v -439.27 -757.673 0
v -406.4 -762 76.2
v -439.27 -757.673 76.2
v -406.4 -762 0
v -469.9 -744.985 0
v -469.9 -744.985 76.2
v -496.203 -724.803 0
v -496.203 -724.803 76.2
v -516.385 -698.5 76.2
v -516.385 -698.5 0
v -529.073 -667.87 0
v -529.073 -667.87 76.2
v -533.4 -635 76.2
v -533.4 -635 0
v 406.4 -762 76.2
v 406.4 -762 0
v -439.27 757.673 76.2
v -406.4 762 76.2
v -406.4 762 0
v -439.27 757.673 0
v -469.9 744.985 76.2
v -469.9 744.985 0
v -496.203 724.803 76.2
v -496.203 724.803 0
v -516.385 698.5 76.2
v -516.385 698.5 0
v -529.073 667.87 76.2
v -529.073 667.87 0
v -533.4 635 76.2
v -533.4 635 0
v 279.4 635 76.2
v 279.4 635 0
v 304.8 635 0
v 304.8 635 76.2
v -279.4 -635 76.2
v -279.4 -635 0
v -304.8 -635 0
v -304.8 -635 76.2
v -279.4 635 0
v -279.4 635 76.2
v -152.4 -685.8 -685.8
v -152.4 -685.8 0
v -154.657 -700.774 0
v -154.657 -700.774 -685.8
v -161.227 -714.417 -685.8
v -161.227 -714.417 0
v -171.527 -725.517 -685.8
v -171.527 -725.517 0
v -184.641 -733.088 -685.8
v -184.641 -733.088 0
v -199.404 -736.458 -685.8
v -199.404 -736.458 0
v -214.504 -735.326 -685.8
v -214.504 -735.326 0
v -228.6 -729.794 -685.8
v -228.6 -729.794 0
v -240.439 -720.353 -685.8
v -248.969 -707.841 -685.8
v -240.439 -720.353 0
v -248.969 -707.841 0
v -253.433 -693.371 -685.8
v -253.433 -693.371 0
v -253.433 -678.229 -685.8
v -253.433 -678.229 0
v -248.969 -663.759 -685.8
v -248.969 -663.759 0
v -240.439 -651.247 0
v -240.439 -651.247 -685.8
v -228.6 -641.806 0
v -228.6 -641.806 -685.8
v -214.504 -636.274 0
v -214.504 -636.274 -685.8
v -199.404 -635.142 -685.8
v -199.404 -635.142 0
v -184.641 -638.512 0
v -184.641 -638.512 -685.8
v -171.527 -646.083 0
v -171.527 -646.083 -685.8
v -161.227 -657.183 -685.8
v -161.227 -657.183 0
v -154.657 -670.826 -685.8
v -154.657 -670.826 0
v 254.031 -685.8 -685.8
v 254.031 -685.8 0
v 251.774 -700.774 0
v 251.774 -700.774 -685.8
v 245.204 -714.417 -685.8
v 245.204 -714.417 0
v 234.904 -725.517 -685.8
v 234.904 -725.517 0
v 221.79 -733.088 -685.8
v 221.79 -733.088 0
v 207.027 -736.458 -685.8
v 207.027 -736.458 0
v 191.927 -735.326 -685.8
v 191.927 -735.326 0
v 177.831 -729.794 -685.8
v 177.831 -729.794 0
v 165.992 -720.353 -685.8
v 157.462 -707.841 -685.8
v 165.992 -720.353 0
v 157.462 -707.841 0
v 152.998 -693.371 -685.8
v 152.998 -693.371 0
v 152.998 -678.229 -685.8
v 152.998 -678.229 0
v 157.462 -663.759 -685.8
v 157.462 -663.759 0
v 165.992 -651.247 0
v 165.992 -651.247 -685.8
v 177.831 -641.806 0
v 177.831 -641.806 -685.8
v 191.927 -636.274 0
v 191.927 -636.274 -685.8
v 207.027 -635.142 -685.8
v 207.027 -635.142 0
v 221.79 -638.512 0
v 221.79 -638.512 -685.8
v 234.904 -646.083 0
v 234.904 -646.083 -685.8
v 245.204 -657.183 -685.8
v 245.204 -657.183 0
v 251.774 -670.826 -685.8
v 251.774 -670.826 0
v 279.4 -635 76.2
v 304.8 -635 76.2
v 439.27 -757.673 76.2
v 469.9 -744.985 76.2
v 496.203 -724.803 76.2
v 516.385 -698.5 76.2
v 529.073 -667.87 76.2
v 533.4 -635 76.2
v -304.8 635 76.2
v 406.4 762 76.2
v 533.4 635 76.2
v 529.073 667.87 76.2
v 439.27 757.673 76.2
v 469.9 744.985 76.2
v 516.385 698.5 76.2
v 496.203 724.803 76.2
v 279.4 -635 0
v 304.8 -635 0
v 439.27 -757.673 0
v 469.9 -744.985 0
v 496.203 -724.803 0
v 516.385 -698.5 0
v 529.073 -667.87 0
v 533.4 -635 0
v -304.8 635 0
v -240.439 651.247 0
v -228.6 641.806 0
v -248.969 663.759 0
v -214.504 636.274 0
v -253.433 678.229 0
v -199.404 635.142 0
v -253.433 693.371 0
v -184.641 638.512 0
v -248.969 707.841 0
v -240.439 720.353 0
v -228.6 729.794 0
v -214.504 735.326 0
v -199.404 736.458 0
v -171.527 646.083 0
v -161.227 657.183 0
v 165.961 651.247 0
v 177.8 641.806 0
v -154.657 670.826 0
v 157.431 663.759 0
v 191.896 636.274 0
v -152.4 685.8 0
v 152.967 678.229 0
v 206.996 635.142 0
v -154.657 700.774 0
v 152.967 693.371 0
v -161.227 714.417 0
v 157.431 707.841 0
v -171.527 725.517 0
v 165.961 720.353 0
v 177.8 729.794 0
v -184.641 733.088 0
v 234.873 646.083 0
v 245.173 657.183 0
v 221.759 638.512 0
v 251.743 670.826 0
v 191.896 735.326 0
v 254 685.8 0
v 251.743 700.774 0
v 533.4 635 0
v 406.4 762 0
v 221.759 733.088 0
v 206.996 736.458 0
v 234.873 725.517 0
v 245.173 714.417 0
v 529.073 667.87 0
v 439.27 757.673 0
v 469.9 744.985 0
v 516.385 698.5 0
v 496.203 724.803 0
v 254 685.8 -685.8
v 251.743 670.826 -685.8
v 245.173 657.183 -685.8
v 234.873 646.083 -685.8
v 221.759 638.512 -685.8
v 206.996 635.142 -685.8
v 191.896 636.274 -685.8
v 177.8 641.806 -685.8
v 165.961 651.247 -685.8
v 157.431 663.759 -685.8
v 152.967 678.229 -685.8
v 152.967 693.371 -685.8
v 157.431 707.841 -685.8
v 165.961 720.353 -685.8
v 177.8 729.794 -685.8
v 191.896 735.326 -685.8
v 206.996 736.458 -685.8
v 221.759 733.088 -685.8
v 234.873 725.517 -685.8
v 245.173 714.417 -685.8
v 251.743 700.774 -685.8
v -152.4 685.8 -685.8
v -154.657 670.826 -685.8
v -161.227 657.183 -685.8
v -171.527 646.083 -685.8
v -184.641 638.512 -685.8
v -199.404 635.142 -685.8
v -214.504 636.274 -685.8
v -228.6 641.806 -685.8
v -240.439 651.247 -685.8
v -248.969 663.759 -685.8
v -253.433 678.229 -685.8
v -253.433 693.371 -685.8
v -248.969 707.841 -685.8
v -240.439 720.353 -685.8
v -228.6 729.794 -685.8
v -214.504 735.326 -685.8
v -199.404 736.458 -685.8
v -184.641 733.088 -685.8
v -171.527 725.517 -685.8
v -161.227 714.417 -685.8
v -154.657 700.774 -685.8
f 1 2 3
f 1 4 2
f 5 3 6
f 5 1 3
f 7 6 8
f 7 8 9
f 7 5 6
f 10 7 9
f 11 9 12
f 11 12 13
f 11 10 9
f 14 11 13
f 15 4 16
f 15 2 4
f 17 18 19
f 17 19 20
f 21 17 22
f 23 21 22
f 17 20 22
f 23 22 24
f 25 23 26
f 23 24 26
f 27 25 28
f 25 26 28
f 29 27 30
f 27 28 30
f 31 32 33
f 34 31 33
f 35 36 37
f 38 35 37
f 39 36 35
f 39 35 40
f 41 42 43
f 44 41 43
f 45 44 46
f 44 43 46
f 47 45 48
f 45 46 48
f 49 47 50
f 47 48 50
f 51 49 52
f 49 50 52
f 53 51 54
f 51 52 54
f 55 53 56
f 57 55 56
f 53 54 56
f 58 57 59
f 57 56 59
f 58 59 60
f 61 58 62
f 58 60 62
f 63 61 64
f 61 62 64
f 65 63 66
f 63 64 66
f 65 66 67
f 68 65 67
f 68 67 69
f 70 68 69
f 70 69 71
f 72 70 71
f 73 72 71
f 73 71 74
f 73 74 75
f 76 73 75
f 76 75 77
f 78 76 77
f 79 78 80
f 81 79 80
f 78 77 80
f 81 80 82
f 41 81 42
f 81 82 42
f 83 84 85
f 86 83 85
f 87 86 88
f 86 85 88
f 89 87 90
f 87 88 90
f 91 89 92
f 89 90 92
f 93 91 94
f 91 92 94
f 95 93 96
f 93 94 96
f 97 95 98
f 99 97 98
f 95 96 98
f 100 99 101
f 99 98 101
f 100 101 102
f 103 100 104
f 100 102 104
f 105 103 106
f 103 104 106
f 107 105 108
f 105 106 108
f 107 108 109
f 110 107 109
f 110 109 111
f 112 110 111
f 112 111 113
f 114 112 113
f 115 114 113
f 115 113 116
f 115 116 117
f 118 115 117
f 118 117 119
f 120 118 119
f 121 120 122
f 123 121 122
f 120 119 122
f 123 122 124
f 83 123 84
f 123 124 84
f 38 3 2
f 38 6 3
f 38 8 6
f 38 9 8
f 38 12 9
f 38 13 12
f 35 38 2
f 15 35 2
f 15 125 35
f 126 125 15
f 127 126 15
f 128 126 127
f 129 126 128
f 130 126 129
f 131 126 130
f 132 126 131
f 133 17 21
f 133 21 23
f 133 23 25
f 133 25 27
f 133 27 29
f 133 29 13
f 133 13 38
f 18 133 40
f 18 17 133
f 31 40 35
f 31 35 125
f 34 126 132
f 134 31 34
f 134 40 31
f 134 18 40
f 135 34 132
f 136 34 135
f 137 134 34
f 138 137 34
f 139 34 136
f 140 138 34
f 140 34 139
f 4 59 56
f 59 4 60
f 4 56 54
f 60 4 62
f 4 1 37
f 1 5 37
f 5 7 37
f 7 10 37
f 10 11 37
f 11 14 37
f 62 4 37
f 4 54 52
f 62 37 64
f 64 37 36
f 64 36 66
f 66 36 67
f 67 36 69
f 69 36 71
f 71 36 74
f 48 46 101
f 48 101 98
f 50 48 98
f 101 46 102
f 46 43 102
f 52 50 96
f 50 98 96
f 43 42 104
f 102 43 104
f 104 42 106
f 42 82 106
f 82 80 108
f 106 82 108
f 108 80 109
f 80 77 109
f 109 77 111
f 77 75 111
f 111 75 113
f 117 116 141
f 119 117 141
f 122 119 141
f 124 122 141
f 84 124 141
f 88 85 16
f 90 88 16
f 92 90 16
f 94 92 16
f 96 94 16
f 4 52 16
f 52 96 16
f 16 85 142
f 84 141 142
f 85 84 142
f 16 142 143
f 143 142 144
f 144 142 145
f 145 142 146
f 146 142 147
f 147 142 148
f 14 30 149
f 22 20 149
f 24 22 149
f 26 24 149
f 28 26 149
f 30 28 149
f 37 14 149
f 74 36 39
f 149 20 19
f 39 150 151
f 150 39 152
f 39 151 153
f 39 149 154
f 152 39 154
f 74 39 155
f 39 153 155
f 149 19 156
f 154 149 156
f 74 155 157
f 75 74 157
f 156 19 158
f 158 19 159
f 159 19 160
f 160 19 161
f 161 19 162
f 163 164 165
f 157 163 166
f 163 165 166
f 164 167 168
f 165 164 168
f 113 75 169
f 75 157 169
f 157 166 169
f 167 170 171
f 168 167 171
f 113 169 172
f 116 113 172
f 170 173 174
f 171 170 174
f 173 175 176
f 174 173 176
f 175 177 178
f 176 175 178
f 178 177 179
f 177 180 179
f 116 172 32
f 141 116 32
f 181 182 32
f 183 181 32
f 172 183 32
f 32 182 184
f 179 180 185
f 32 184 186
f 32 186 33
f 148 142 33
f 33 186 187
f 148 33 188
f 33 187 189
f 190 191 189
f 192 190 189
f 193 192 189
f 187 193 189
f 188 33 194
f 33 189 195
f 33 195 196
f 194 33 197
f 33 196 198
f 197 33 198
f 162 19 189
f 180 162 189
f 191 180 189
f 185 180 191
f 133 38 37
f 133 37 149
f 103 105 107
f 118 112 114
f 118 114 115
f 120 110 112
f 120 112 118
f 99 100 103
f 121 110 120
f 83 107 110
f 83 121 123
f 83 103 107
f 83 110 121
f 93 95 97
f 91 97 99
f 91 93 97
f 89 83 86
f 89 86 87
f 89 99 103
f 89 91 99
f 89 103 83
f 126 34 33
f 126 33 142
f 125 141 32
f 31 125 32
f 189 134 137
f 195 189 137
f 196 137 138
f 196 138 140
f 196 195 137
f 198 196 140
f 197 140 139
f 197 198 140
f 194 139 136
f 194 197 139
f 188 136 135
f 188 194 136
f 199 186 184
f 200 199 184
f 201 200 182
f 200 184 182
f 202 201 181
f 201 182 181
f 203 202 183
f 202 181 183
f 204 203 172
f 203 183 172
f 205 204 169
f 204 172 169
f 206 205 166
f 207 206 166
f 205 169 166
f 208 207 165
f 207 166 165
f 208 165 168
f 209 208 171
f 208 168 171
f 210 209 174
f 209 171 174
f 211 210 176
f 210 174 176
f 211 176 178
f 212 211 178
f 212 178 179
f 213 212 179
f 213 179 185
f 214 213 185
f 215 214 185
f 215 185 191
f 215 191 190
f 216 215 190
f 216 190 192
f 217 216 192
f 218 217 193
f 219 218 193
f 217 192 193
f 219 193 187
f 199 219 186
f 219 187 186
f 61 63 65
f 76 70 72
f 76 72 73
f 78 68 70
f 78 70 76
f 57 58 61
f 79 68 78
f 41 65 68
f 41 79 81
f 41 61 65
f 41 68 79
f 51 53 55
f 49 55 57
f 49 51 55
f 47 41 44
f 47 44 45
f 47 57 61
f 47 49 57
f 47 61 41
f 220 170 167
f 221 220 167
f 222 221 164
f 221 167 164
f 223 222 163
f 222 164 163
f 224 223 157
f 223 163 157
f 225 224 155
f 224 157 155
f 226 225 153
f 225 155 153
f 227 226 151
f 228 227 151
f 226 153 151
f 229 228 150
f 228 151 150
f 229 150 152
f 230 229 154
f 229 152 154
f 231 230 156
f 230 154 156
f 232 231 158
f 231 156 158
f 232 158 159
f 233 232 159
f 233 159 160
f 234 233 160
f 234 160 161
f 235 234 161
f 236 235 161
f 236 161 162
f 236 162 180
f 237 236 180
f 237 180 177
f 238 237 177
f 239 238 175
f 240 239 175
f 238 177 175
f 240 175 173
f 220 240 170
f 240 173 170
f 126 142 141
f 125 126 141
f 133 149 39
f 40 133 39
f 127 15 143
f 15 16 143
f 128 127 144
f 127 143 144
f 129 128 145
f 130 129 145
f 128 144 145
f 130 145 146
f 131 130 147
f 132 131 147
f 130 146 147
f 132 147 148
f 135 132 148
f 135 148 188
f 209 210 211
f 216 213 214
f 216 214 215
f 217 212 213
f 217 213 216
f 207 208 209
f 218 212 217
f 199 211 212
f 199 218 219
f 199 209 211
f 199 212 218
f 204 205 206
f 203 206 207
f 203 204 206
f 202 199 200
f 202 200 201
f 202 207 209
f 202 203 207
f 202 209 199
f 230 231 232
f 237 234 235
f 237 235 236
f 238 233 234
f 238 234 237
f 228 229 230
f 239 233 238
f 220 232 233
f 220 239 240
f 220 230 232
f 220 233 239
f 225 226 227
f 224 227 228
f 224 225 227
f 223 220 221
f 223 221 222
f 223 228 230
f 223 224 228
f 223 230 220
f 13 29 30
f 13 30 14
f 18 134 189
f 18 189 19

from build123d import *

# Parameters (mm, degrees)
F0_W     = 558.8
F0_H     = 1524
F1_DEPTH = 76.2
F2_R     = 50.8
F3_DEPTH = 685.8
F5_DEPTH = 76.2
F6_R     = 127


with BuildPart() as f1:
    # F0 (on Top) → F1 (new body)
    with BuildSketch(Plane.XY):
        Rectangle(F0_W, F0_H)
    extrude(amount=F1_DEPTH)

    # F2 (on face) → F3 (join)
    with BuildSketch(Plane(origin=(0, 0, 0), x_dir=(1, 0, 0), z_dir=(0, 0, -1))):
        with Locations((-203.2, -685.8)):
            Circle(F2_R)
        with Locations((203.2, -685.8)):
            Circle(F2_R)
        with Locations((203.231033, 685.8)):
            Circle(F2_R)
        with Locations((-203.2, 685.8)):
            Circle(F2_R)
    extrude(amount=F3_DEPTH)

    # F4 (on face) → F5 (join)
    with BuildSketch(Plane.XY.offset(76.2)):
        Polygon((-279.4, 635), (-279.4, 762), (-533.4, 762), (-533.4, -762), (-279.4, -762), (-279.4, -635), (-304.8, -635), (-304.8, 635), align=None)
        Polygon((533.4, 762), (279.4, 762), (279.4, 635), (304.8, 635), (304.8, -635), (279.4, -635), (279.4, -762), (533.4, -762), align=None)
    extrude(amount=-F5_DEPTH)

    # F6
    f6_edges = [f1.edges().sort_by_distance(p)[0] for p in [
        (-533.4, -762, 38.1),
        (533.4, -762, 38.1),
        (533.4, 762, 38.1),
        (-533.4, 762, 38.1),
    ]]
    fillet(f6_edges, radius=F6_R)


solid = f1.part
